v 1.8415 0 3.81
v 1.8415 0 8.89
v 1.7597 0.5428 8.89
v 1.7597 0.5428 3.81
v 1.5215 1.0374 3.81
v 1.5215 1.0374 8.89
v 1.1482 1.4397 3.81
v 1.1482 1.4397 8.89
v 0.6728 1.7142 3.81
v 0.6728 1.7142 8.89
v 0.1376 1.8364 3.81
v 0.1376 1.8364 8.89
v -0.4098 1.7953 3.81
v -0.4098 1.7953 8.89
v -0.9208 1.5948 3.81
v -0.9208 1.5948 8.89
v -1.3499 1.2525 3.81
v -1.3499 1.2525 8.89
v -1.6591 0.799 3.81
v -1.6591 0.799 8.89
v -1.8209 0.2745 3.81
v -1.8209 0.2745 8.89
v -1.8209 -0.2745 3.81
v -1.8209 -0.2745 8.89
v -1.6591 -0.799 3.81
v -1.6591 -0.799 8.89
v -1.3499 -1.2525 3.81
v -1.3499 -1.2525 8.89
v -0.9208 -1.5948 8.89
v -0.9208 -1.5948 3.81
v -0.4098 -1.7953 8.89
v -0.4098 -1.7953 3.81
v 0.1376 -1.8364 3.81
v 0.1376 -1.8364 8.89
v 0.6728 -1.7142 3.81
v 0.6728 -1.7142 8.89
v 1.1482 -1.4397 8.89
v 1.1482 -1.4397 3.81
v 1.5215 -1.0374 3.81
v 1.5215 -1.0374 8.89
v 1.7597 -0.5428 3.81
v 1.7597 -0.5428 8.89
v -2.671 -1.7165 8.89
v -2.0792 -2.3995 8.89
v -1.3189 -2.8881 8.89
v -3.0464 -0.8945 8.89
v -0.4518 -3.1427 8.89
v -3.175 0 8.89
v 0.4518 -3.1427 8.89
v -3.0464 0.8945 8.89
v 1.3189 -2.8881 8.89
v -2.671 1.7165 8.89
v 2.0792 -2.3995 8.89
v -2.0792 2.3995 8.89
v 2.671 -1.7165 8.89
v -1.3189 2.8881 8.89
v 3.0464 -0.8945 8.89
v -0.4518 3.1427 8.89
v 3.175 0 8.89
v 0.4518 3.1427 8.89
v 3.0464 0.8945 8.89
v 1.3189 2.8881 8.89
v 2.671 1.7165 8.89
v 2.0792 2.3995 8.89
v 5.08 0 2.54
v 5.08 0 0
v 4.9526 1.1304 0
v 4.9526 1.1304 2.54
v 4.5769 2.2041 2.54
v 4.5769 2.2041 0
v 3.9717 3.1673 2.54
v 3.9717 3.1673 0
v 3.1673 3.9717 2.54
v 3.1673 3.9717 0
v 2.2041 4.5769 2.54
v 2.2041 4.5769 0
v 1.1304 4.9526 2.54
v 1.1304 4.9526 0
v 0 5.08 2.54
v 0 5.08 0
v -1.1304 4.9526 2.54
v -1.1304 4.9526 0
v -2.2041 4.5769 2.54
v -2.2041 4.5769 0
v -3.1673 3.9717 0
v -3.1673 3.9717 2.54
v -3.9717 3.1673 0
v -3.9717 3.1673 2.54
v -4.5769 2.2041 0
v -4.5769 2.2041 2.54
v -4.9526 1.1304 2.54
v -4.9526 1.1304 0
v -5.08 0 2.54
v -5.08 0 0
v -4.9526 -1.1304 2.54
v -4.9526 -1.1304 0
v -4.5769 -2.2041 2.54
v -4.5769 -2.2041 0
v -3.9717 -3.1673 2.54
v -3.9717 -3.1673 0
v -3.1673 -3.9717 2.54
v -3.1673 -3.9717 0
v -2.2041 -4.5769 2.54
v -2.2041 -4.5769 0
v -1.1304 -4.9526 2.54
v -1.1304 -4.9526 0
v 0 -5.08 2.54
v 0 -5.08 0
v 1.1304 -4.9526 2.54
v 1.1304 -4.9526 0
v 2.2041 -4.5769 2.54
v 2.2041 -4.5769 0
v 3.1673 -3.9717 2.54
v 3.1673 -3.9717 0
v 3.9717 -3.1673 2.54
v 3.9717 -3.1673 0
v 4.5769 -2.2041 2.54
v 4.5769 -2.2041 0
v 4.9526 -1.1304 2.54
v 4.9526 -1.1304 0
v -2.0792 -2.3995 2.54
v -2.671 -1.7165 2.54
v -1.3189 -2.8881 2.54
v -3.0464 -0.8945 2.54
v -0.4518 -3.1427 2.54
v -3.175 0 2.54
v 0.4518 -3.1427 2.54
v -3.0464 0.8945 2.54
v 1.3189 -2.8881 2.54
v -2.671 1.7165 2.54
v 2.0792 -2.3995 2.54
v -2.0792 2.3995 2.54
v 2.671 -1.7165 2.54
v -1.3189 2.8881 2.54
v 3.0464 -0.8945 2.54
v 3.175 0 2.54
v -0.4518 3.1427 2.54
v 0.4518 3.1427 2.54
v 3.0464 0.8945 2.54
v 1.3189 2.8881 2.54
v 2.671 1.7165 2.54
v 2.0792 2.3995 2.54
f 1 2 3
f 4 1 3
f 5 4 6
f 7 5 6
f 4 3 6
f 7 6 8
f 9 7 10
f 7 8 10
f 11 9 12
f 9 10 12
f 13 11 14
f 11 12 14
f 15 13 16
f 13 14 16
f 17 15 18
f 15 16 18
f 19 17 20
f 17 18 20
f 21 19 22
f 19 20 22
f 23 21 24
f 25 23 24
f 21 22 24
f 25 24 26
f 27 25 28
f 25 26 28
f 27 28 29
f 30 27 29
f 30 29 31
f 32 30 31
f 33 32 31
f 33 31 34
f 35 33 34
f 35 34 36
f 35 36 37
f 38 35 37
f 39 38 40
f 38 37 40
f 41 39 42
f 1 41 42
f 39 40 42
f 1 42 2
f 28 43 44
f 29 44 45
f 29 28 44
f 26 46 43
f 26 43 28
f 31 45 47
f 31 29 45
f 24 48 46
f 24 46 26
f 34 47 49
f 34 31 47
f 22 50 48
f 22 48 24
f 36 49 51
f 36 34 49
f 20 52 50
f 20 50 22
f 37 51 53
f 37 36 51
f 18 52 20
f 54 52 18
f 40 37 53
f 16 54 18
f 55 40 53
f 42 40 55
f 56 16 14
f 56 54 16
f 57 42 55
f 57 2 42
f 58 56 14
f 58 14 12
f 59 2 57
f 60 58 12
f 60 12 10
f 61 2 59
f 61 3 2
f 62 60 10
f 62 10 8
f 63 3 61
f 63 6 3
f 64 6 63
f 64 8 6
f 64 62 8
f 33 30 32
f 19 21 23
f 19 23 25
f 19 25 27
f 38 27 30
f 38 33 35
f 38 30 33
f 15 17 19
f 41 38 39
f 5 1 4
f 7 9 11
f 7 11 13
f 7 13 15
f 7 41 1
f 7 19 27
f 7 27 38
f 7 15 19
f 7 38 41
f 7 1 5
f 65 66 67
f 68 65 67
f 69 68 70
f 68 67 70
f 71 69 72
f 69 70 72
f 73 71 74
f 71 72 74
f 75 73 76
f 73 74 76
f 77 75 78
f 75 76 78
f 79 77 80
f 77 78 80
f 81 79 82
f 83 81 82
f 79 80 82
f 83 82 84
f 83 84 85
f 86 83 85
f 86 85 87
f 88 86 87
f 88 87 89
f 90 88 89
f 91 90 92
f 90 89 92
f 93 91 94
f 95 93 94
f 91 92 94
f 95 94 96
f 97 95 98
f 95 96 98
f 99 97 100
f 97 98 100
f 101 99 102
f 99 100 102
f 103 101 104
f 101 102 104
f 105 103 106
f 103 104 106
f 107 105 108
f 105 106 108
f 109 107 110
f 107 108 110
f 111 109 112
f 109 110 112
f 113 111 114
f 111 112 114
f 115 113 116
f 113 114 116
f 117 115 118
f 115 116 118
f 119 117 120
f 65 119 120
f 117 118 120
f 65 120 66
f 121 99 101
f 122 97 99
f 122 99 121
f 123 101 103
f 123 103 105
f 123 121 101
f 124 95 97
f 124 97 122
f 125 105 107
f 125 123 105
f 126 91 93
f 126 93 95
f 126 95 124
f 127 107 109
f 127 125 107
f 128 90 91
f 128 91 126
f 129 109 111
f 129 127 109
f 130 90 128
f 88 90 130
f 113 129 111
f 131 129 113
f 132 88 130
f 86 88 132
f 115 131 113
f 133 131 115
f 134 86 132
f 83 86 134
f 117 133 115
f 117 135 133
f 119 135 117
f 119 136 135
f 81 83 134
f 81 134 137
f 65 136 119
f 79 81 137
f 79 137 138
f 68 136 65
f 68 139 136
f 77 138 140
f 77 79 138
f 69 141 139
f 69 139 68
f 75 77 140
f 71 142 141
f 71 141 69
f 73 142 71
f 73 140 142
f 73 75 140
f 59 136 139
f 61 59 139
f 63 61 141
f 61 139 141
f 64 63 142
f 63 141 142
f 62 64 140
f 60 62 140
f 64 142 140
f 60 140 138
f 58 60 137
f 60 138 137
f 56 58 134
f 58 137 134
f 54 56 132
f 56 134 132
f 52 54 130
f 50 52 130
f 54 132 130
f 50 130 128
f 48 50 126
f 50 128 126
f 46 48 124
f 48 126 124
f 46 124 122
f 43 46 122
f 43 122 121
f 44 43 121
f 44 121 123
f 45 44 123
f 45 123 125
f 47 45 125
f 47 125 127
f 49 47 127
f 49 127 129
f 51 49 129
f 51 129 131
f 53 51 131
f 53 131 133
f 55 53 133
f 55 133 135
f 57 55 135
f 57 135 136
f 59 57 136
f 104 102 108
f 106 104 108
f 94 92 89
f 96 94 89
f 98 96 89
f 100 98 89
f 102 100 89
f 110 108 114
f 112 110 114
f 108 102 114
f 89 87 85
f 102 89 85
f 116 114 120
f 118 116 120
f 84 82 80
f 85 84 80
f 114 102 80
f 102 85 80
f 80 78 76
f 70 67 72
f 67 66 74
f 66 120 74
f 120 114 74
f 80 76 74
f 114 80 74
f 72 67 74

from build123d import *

# Parameters (mm, degrees)
F0_R     = 3.175
F1_DEPTH = 8.89
F2_R     = 1.8415
F3_DEPTH = 5.08
F0_R_2   = 5.08
F4_DEPTH = 2.54


with BuildPart() as f1:
    # F0 (on Top) → F1 (new body)
    with BuildSketch(Plane.XY):
        Circle(F0_R)
    extrude(amount=F1_DEPTH)

    # F2 (on face) → F3 (cut)
    with BuildSketch(Plane.XY.offset(8.89)):
        Circle(F2_R)
    extrude(amount=-F3_DEPTH, mode=Mode.SUBTRACT)

    # F0 (on Top) → F4 (join)
    with BuildSketch(Plane.XY):
        Circle(F0_R_2)
        Circle(F0_R, mode=Mode.SUBTRACT)
    extrude(amount=F4_DEPTH)


solid = f1.part
